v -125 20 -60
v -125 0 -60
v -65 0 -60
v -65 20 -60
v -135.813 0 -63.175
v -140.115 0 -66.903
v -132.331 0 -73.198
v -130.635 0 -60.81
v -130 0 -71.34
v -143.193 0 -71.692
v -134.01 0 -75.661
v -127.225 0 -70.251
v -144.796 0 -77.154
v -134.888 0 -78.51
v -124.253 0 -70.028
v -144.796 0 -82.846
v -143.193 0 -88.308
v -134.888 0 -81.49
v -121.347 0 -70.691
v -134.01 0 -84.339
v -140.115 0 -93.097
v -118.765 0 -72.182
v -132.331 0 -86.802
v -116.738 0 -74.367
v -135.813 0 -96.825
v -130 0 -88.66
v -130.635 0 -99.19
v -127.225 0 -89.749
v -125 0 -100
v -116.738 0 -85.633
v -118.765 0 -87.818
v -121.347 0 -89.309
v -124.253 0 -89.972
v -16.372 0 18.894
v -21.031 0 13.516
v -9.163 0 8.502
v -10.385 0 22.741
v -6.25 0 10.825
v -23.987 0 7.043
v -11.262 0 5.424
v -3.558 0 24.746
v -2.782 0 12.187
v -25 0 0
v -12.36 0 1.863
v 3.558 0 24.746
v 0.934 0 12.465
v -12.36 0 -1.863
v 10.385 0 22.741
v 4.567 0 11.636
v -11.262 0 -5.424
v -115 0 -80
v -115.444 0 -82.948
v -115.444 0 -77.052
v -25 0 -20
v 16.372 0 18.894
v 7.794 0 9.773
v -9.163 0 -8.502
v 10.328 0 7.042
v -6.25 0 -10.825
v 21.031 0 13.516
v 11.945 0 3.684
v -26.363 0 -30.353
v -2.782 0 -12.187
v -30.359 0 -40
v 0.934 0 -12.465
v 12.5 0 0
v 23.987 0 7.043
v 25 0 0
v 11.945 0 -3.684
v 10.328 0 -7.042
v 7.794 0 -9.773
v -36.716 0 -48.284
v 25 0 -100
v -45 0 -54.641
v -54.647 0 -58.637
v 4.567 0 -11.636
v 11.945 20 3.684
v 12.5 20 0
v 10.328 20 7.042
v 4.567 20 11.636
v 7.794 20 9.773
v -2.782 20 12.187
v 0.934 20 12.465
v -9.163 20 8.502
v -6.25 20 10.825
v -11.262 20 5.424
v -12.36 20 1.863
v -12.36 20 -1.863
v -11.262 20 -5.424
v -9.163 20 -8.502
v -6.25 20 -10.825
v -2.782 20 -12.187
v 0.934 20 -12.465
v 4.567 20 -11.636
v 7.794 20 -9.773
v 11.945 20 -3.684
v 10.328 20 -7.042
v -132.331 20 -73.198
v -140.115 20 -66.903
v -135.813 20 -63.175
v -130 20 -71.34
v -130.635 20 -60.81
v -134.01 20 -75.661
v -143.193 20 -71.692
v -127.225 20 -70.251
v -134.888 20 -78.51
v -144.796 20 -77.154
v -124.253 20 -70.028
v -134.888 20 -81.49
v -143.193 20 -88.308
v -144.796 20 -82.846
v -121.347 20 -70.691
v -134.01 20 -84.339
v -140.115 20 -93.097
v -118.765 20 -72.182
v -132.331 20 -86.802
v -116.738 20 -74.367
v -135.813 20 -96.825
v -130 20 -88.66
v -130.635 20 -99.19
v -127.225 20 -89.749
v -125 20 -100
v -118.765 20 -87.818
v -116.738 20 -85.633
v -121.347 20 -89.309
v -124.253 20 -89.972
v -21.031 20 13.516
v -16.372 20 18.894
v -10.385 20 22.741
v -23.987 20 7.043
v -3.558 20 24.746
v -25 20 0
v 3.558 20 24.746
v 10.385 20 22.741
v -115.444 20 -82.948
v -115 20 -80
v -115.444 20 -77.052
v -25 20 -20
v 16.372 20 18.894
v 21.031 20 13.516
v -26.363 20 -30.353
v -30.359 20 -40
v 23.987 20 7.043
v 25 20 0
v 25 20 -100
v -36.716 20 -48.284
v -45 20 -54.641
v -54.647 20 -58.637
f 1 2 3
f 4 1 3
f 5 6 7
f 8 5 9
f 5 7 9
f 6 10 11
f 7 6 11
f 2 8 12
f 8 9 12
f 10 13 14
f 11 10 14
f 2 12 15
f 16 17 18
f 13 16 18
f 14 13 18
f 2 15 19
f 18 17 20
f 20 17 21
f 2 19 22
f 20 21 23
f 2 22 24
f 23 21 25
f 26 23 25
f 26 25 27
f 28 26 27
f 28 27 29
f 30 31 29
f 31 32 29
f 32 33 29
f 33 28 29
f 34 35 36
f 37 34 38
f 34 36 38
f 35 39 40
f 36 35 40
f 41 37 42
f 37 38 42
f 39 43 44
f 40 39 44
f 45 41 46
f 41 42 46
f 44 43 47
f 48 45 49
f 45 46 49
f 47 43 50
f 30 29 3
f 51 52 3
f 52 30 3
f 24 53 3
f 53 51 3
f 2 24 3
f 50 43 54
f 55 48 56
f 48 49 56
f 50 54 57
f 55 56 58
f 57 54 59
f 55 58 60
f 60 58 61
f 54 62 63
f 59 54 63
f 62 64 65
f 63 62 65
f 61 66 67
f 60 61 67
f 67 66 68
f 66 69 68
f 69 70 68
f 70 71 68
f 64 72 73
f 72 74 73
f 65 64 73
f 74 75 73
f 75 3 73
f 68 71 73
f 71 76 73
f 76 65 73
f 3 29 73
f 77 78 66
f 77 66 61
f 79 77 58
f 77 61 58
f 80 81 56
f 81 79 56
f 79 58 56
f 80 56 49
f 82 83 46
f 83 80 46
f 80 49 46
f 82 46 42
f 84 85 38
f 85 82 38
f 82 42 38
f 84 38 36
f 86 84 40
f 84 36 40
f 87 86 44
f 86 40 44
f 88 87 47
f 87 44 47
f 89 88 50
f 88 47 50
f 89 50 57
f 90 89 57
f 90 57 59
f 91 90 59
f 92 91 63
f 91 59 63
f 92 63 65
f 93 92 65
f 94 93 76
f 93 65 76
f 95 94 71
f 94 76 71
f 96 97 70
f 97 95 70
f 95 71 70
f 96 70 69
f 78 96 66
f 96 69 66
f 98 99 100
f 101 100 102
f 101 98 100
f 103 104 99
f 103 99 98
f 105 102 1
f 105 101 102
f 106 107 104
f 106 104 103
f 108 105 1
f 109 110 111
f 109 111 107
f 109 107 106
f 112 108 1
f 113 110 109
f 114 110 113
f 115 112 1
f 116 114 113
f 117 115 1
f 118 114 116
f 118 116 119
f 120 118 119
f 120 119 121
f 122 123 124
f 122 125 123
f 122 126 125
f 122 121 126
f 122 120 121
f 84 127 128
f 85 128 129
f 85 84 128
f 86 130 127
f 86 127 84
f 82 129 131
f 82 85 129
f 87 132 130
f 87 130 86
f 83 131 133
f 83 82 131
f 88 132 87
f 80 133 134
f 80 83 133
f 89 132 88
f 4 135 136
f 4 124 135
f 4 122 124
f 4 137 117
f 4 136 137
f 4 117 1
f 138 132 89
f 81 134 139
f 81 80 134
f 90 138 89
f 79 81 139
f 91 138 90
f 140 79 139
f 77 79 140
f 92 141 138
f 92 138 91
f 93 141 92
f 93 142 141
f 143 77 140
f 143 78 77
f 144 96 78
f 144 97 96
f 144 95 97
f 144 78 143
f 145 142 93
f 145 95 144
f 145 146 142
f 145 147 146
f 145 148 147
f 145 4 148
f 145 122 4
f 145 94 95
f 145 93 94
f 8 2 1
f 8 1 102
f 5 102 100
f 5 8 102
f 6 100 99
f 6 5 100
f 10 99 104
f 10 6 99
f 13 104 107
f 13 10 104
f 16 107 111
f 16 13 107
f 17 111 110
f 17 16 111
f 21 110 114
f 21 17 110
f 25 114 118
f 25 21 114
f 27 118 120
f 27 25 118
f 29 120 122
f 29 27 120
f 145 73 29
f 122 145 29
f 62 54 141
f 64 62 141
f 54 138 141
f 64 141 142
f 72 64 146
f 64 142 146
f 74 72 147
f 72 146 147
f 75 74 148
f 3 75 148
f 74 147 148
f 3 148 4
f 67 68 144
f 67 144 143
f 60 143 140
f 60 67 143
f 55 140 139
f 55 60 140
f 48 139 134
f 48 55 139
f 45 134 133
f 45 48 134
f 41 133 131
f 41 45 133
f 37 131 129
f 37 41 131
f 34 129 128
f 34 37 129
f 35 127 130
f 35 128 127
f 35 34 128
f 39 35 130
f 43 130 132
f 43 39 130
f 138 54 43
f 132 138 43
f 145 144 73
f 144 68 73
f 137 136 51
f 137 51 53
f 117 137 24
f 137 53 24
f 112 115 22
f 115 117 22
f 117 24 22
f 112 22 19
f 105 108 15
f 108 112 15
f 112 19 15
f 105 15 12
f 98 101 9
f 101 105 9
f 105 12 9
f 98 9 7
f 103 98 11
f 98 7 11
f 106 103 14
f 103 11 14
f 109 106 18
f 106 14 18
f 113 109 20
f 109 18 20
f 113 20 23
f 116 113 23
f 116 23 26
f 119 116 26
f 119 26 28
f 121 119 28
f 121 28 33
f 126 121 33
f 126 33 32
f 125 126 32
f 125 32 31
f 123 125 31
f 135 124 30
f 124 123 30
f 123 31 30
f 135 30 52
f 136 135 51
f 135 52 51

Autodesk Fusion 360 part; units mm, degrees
sketch "Sketch1" plane through (0, 0, 0) normal (0, 1, 0) x (1, 0, 0)
  line L0 (24.3392, -13.8982) -> (-125.6608, -13.8982)
  arc A0 (-125.6608, -13.8982) -> (-125.6608, -53.8982) centre (-125.6608, -33.8982) ccw
  arc A1 (-14.3201, -29.8888) -> (-14.3202, -29.8887) centre (-14.3202, -29.8888) ccw
  line L1 (-14.3201, -29.8888) -> (-14.3201, -30.0005)
  arc A2 (-25.6608, -113.8982) -> (24.3392, -113.8982) centre (-0.6608, -113.8982) ccw
  line L2 (24.3392, -113.8982) -> (24.3392, -13.8982)
  line L3 (-125.6608, -53.8982) -> (-65.6608, -53.8982)
  arc A3 (-25.6608, -93.8982) -> (-65.6608, -53.8982) centre (-65.6608, -93.8982) ccw
  line L4 (-25.6608, -93.8982) -> (-25.6608, -113.8982)
  circle A4 centre (-0.6608, -113.8982) radius 12.5
  circle A5 centre (-125.6608, -33.8982) radius 10
  dimension "d1" = 100
  dimension "d2" = 150
  dimension "d3" = 20
  dimension "d4" = 25
  dimension "d5" = 40
  dimension "d6" = 25
  dimension "d7" = 20
sketch "Sketch2" plane through (0, 0, 0) normal (0, 1, 0) x (1, 0, 0)
  line L0 (25, 100) -> (-125, 100)
  arc A0 (-125, 100) -> (-125, 60) centre (-125, 80) ccw
  line L1 (-125, 60) -> (-25, 60)
  line L2 (-25, 60) -> (-25, 0)
  arc A1 (-25, 0) -> (25, 0) centre (0, 0) ccw
  line L3 (25, 0) -> (25, 100)
  circle A2 centre (0, 0) radius 12.5
  circle A3 centre (-125, 80) radius 10
  dimension "d10" = 150
  dimension "d11" = 100
  dimension "d12" = 25
  dimension "d13" = 20
  dimension "d14" = 25
  dimension "d15" = 20
extrude "Extrude2" add sketch "Sketch2" along normal blind 20
fillet "Fillet1" radius 40 1 edges at (-25, 10, -60)
